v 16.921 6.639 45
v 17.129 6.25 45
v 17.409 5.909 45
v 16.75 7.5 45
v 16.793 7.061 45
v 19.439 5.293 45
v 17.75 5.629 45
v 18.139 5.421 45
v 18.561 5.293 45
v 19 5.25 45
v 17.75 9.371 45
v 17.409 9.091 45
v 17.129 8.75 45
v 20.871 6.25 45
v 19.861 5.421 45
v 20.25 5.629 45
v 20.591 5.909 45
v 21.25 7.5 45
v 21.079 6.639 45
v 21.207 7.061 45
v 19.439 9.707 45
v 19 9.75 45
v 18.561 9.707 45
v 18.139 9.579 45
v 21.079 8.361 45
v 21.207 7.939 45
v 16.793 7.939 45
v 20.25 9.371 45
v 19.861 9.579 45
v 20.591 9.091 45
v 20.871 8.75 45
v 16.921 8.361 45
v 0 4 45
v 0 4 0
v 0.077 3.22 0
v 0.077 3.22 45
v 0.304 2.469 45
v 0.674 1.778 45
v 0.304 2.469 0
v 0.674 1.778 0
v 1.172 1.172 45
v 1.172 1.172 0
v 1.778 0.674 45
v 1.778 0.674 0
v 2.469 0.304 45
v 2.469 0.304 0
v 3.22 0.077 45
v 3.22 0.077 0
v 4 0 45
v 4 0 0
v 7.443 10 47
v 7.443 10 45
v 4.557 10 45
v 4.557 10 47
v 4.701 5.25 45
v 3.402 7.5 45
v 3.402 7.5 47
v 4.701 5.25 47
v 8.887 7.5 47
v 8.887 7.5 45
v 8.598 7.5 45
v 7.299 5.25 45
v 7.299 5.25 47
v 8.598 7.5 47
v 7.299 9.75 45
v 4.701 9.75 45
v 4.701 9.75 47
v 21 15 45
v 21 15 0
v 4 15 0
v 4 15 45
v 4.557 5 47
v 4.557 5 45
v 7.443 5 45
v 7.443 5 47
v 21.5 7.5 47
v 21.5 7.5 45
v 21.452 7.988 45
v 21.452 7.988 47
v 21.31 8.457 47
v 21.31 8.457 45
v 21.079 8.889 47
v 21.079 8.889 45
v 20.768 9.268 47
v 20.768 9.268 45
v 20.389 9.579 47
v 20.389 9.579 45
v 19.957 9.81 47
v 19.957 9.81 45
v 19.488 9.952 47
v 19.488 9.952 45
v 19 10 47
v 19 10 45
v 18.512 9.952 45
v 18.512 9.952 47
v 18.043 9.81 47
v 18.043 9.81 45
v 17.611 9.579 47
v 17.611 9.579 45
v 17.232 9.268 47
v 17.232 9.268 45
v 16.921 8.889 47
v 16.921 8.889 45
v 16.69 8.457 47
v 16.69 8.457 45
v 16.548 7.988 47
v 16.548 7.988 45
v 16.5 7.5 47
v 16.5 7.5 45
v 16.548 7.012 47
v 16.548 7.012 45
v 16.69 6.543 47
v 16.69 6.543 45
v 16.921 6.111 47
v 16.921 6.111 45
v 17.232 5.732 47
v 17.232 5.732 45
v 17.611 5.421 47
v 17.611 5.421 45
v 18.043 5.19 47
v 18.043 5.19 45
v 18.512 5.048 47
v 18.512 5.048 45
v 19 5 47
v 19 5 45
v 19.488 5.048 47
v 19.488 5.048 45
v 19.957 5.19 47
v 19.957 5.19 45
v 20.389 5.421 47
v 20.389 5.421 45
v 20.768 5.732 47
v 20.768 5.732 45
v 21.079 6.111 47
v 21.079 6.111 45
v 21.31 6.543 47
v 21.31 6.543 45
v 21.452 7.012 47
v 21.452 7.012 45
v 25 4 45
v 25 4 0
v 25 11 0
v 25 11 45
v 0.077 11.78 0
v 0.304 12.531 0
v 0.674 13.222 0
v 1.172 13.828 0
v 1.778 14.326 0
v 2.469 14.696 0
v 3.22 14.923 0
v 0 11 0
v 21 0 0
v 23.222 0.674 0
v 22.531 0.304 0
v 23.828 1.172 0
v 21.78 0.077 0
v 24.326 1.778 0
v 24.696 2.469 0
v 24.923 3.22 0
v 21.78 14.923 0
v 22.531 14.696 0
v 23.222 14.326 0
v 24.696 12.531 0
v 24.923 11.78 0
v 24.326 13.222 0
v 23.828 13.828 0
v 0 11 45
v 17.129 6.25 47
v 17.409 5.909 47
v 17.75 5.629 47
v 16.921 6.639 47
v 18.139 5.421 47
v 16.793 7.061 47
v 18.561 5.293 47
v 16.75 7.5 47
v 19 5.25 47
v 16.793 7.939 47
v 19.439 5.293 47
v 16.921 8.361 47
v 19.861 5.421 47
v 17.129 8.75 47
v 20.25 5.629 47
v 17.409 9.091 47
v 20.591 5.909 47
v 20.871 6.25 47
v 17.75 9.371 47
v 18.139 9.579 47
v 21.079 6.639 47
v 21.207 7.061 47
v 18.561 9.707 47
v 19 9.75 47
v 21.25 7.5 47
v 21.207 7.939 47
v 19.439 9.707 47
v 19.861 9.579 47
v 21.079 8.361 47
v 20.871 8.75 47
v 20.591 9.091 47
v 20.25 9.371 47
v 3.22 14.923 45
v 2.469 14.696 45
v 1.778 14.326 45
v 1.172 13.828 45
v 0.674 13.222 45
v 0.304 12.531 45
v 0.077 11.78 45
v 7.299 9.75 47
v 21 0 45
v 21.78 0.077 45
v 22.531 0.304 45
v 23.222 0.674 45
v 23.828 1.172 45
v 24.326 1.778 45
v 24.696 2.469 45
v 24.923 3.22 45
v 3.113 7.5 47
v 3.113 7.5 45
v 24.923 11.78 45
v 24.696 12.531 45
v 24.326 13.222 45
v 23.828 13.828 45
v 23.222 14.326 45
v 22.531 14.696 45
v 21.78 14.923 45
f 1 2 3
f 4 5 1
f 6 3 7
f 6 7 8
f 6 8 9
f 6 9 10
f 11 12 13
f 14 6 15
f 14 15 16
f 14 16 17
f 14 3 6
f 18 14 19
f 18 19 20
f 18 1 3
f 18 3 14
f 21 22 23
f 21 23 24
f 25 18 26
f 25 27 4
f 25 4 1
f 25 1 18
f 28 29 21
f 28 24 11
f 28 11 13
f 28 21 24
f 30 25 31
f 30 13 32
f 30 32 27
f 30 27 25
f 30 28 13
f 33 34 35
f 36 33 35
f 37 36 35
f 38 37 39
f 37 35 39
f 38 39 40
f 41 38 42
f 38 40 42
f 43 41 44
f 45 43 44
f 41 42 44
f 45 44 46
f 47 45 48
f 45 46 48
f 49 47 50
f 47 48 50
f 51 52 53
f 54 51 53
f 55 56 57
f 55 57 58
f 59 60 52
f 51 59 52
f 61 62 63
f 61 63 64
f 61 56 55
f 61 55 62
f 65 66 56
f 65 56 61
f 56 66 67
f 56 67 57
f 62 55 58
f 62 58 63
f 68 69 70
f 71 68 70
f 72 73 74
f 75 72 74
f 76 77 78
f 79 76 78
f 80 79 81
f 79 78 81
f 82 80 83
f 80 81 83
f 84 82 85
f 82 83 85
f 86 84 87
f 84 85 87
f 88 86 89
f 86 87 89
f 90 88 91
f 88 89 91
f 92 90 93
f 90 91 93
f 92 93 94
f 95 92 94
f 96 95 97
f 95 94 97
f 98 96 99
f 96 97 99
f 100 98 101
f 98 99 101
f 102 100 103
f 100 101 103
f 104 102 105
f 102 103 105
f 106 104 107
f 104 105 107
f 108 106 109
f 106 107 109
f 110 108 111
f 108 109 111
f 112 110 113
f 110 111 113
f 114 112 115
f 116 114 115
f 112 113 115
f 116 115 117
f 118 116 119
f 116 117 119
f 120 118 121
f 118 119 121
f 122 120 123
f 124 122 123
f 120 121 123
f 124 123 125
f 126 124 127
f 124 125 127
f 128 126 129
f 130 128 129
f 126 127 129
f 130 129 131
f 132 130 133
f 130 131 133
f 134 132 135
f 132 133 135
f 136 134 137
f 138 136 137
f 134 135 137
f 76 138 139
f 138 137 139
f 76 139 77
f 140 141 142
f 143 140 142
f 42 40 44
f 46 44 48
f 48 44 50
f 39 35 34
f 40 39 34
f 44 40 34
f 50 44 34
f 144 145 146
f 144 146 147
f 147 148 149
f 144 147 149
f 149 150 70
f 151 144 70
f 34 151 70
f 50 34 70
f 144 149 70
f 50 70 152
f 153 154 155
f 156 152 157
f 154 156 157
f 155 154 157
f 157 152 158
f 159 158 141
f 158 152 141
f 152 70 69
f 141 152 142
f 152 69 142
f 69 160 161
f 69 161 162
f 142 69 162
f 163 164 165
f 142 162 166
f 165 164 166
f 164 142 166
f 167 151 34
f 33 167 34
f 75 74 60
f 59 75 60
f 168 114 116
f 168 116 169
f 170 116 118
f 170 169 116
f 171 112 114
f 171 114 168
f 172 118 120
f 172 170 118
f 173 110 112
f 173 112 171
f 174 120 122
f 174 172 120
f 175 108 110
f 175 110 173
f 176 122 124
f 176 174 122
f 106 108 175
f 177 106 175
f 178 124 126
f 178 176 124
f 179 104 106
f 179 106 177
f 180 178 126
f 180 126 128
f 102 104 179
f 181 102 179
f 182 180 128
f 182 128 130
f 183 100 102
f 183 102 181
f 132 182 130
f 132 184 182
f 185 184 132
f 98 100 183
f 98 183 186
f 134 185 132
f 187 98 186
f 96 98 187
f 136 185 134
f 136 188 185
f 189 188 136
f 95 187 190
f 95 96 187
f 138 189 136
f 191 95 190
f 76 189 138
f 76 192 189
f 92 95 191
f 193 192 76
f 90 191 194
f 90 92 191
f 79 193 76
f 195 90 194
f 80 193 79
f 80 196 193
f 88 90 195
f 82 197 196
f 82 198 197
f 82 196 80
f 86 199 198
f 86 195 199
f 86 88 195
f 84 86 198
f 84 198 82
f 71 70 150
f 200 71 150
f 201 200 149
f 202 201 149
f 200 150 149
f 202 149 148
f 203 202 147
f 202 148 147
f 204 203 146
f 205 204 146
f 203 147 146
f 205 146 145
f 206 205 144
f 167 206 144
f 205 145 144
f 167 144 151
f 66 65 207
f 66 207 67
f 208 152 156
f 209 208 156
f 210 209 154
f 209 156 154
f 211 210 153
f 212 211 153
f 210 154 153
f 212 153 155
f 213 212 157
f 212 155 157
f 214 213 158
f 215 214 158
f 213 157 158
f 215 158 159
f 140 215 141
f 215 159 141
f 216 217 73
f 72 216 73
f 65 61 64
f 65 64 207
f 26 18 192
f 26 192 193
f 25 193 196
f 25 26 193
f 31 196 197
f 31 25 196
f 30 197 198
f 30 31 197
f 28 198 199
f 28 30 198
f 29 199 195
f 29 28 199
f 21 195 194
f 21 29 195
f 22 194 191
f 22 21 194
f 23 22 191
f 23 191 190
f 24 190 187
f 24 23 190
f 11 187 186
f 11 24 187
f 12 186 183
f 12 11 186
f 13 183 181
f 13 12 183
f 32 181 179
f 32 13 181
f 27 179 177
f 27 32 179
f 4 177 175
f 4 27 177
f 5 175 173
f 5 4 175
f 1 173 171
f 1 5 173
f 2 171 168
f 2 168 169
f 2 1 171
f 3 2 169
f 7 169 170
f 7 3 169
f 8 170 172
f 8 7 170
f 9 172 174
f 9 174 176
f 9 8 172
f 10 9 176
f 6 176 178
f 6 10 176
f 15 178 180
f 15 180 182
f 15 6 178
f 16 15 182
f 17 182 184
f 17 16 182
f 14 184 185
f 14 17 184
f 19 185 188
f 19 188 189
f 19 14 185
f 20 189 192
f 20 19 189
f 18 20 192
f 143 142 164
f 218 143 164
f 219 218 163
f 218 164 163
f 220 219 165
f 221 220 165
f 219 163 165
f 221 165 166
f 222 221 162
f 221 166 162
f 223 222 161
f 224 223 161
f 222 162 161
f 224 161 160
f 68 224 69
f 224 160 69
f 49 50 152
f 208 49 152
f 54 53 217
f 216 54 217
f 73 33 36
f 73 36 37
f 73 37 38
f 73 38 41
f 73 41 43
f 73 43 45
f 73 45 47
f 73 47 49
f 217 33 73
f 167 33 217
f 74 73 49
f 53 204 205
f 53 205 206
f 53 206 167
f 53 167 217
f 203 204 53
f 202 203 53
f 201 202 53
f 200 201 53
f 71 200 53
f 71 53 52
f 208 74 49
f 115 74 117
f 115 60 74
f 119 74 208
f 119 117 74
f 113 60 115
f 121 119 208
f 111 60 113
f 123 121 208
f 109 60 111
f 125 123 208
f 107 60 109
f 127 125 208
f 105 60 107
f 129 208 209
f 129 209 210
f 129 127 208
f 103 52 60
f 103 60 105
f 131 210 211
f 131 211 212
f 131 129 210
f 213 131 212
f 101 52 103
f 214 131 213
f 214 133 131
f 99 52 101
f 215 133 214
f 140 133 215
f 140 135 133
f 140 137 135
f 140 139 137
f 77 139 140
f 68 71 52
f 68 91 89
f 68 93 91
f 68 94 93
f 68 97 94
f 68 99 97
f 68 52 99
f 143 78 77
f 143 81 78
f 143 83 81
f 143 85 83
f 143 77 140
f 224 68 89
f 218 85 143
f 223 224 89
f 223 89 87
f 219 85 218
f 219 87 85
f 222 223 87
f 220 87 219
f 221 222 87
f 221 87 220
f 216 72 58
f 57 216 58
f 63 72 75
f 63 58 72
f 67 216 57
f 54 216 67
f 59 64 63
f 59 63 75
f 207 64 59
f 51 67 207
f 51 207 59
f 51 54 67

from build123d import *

# Parameters (mm, degrees)
BOSS_EXTRUDE1_DEPTH = 45
SKETCH2_R           = 2.5
SKETCH2_R_2         = 2.25
BOSS_EXTRUDE2_DEPTH = 2


with BuildPart() as part:
    # Sketch1 → Boss-Extrude1 (new body)
    with BuildSketch(Plane.XY):
        with BuildLine():
            Line((4, 0), (21, 0))
            ThreePointArc((21, 0), (23.828427125, 1.171572875), (25, 4))
            Line((25, 4), (25, 11))
            ThreePointArc((25, 11), (23.828427125, 13.828427125), (21, 15))
            Line((21, 15), (4, 15))
            ThreePointArc((4, 15), (1.171572875, 13.828427125), (0, 11))
            Line((0, 11), (0, 4))
            ThreePointArc((0, 4), (1.171572875, 1.171572875), (4, 0))
        make_face()
    extrude(amount=BOSS_EXTRUDE1_DEPTH)

    # Sketch2 → Boss-Extrude2 (add)
    # profile 1 of 2: a face of its own
    with BuildSketch(Plane.XY.offset(45)):
        with Locations((19, 7.5)):
            Circle(SKETCH2_R)
        with Locations((19, 7.5)):
            Circle(SKETCH2_R_2, mode=Mode.SUBTRACT)
    # profile 2 of 2: a face of its own
    with BuildSketch(Plane.XY.offset(45)):
        Polygon((8.886751346, 7.5), (7.443375673, 10), (4.556624327, 10), (3.113248654, 7.5), (4.556624327, 5), (7.443375673, 5), align=None)
        Polygon((8.598076211, 7.5), (7.299038106, 9.75), (4.700961894, 9.75), (3.401923789, 7.5), (4.700961894, 5.25), (7.299038106, 5.25), align=None, mode=Mode.SUBTRACT)
    extrude(amount=BOSS_EXTRUDE2_DEPTH)


solid = part.part
